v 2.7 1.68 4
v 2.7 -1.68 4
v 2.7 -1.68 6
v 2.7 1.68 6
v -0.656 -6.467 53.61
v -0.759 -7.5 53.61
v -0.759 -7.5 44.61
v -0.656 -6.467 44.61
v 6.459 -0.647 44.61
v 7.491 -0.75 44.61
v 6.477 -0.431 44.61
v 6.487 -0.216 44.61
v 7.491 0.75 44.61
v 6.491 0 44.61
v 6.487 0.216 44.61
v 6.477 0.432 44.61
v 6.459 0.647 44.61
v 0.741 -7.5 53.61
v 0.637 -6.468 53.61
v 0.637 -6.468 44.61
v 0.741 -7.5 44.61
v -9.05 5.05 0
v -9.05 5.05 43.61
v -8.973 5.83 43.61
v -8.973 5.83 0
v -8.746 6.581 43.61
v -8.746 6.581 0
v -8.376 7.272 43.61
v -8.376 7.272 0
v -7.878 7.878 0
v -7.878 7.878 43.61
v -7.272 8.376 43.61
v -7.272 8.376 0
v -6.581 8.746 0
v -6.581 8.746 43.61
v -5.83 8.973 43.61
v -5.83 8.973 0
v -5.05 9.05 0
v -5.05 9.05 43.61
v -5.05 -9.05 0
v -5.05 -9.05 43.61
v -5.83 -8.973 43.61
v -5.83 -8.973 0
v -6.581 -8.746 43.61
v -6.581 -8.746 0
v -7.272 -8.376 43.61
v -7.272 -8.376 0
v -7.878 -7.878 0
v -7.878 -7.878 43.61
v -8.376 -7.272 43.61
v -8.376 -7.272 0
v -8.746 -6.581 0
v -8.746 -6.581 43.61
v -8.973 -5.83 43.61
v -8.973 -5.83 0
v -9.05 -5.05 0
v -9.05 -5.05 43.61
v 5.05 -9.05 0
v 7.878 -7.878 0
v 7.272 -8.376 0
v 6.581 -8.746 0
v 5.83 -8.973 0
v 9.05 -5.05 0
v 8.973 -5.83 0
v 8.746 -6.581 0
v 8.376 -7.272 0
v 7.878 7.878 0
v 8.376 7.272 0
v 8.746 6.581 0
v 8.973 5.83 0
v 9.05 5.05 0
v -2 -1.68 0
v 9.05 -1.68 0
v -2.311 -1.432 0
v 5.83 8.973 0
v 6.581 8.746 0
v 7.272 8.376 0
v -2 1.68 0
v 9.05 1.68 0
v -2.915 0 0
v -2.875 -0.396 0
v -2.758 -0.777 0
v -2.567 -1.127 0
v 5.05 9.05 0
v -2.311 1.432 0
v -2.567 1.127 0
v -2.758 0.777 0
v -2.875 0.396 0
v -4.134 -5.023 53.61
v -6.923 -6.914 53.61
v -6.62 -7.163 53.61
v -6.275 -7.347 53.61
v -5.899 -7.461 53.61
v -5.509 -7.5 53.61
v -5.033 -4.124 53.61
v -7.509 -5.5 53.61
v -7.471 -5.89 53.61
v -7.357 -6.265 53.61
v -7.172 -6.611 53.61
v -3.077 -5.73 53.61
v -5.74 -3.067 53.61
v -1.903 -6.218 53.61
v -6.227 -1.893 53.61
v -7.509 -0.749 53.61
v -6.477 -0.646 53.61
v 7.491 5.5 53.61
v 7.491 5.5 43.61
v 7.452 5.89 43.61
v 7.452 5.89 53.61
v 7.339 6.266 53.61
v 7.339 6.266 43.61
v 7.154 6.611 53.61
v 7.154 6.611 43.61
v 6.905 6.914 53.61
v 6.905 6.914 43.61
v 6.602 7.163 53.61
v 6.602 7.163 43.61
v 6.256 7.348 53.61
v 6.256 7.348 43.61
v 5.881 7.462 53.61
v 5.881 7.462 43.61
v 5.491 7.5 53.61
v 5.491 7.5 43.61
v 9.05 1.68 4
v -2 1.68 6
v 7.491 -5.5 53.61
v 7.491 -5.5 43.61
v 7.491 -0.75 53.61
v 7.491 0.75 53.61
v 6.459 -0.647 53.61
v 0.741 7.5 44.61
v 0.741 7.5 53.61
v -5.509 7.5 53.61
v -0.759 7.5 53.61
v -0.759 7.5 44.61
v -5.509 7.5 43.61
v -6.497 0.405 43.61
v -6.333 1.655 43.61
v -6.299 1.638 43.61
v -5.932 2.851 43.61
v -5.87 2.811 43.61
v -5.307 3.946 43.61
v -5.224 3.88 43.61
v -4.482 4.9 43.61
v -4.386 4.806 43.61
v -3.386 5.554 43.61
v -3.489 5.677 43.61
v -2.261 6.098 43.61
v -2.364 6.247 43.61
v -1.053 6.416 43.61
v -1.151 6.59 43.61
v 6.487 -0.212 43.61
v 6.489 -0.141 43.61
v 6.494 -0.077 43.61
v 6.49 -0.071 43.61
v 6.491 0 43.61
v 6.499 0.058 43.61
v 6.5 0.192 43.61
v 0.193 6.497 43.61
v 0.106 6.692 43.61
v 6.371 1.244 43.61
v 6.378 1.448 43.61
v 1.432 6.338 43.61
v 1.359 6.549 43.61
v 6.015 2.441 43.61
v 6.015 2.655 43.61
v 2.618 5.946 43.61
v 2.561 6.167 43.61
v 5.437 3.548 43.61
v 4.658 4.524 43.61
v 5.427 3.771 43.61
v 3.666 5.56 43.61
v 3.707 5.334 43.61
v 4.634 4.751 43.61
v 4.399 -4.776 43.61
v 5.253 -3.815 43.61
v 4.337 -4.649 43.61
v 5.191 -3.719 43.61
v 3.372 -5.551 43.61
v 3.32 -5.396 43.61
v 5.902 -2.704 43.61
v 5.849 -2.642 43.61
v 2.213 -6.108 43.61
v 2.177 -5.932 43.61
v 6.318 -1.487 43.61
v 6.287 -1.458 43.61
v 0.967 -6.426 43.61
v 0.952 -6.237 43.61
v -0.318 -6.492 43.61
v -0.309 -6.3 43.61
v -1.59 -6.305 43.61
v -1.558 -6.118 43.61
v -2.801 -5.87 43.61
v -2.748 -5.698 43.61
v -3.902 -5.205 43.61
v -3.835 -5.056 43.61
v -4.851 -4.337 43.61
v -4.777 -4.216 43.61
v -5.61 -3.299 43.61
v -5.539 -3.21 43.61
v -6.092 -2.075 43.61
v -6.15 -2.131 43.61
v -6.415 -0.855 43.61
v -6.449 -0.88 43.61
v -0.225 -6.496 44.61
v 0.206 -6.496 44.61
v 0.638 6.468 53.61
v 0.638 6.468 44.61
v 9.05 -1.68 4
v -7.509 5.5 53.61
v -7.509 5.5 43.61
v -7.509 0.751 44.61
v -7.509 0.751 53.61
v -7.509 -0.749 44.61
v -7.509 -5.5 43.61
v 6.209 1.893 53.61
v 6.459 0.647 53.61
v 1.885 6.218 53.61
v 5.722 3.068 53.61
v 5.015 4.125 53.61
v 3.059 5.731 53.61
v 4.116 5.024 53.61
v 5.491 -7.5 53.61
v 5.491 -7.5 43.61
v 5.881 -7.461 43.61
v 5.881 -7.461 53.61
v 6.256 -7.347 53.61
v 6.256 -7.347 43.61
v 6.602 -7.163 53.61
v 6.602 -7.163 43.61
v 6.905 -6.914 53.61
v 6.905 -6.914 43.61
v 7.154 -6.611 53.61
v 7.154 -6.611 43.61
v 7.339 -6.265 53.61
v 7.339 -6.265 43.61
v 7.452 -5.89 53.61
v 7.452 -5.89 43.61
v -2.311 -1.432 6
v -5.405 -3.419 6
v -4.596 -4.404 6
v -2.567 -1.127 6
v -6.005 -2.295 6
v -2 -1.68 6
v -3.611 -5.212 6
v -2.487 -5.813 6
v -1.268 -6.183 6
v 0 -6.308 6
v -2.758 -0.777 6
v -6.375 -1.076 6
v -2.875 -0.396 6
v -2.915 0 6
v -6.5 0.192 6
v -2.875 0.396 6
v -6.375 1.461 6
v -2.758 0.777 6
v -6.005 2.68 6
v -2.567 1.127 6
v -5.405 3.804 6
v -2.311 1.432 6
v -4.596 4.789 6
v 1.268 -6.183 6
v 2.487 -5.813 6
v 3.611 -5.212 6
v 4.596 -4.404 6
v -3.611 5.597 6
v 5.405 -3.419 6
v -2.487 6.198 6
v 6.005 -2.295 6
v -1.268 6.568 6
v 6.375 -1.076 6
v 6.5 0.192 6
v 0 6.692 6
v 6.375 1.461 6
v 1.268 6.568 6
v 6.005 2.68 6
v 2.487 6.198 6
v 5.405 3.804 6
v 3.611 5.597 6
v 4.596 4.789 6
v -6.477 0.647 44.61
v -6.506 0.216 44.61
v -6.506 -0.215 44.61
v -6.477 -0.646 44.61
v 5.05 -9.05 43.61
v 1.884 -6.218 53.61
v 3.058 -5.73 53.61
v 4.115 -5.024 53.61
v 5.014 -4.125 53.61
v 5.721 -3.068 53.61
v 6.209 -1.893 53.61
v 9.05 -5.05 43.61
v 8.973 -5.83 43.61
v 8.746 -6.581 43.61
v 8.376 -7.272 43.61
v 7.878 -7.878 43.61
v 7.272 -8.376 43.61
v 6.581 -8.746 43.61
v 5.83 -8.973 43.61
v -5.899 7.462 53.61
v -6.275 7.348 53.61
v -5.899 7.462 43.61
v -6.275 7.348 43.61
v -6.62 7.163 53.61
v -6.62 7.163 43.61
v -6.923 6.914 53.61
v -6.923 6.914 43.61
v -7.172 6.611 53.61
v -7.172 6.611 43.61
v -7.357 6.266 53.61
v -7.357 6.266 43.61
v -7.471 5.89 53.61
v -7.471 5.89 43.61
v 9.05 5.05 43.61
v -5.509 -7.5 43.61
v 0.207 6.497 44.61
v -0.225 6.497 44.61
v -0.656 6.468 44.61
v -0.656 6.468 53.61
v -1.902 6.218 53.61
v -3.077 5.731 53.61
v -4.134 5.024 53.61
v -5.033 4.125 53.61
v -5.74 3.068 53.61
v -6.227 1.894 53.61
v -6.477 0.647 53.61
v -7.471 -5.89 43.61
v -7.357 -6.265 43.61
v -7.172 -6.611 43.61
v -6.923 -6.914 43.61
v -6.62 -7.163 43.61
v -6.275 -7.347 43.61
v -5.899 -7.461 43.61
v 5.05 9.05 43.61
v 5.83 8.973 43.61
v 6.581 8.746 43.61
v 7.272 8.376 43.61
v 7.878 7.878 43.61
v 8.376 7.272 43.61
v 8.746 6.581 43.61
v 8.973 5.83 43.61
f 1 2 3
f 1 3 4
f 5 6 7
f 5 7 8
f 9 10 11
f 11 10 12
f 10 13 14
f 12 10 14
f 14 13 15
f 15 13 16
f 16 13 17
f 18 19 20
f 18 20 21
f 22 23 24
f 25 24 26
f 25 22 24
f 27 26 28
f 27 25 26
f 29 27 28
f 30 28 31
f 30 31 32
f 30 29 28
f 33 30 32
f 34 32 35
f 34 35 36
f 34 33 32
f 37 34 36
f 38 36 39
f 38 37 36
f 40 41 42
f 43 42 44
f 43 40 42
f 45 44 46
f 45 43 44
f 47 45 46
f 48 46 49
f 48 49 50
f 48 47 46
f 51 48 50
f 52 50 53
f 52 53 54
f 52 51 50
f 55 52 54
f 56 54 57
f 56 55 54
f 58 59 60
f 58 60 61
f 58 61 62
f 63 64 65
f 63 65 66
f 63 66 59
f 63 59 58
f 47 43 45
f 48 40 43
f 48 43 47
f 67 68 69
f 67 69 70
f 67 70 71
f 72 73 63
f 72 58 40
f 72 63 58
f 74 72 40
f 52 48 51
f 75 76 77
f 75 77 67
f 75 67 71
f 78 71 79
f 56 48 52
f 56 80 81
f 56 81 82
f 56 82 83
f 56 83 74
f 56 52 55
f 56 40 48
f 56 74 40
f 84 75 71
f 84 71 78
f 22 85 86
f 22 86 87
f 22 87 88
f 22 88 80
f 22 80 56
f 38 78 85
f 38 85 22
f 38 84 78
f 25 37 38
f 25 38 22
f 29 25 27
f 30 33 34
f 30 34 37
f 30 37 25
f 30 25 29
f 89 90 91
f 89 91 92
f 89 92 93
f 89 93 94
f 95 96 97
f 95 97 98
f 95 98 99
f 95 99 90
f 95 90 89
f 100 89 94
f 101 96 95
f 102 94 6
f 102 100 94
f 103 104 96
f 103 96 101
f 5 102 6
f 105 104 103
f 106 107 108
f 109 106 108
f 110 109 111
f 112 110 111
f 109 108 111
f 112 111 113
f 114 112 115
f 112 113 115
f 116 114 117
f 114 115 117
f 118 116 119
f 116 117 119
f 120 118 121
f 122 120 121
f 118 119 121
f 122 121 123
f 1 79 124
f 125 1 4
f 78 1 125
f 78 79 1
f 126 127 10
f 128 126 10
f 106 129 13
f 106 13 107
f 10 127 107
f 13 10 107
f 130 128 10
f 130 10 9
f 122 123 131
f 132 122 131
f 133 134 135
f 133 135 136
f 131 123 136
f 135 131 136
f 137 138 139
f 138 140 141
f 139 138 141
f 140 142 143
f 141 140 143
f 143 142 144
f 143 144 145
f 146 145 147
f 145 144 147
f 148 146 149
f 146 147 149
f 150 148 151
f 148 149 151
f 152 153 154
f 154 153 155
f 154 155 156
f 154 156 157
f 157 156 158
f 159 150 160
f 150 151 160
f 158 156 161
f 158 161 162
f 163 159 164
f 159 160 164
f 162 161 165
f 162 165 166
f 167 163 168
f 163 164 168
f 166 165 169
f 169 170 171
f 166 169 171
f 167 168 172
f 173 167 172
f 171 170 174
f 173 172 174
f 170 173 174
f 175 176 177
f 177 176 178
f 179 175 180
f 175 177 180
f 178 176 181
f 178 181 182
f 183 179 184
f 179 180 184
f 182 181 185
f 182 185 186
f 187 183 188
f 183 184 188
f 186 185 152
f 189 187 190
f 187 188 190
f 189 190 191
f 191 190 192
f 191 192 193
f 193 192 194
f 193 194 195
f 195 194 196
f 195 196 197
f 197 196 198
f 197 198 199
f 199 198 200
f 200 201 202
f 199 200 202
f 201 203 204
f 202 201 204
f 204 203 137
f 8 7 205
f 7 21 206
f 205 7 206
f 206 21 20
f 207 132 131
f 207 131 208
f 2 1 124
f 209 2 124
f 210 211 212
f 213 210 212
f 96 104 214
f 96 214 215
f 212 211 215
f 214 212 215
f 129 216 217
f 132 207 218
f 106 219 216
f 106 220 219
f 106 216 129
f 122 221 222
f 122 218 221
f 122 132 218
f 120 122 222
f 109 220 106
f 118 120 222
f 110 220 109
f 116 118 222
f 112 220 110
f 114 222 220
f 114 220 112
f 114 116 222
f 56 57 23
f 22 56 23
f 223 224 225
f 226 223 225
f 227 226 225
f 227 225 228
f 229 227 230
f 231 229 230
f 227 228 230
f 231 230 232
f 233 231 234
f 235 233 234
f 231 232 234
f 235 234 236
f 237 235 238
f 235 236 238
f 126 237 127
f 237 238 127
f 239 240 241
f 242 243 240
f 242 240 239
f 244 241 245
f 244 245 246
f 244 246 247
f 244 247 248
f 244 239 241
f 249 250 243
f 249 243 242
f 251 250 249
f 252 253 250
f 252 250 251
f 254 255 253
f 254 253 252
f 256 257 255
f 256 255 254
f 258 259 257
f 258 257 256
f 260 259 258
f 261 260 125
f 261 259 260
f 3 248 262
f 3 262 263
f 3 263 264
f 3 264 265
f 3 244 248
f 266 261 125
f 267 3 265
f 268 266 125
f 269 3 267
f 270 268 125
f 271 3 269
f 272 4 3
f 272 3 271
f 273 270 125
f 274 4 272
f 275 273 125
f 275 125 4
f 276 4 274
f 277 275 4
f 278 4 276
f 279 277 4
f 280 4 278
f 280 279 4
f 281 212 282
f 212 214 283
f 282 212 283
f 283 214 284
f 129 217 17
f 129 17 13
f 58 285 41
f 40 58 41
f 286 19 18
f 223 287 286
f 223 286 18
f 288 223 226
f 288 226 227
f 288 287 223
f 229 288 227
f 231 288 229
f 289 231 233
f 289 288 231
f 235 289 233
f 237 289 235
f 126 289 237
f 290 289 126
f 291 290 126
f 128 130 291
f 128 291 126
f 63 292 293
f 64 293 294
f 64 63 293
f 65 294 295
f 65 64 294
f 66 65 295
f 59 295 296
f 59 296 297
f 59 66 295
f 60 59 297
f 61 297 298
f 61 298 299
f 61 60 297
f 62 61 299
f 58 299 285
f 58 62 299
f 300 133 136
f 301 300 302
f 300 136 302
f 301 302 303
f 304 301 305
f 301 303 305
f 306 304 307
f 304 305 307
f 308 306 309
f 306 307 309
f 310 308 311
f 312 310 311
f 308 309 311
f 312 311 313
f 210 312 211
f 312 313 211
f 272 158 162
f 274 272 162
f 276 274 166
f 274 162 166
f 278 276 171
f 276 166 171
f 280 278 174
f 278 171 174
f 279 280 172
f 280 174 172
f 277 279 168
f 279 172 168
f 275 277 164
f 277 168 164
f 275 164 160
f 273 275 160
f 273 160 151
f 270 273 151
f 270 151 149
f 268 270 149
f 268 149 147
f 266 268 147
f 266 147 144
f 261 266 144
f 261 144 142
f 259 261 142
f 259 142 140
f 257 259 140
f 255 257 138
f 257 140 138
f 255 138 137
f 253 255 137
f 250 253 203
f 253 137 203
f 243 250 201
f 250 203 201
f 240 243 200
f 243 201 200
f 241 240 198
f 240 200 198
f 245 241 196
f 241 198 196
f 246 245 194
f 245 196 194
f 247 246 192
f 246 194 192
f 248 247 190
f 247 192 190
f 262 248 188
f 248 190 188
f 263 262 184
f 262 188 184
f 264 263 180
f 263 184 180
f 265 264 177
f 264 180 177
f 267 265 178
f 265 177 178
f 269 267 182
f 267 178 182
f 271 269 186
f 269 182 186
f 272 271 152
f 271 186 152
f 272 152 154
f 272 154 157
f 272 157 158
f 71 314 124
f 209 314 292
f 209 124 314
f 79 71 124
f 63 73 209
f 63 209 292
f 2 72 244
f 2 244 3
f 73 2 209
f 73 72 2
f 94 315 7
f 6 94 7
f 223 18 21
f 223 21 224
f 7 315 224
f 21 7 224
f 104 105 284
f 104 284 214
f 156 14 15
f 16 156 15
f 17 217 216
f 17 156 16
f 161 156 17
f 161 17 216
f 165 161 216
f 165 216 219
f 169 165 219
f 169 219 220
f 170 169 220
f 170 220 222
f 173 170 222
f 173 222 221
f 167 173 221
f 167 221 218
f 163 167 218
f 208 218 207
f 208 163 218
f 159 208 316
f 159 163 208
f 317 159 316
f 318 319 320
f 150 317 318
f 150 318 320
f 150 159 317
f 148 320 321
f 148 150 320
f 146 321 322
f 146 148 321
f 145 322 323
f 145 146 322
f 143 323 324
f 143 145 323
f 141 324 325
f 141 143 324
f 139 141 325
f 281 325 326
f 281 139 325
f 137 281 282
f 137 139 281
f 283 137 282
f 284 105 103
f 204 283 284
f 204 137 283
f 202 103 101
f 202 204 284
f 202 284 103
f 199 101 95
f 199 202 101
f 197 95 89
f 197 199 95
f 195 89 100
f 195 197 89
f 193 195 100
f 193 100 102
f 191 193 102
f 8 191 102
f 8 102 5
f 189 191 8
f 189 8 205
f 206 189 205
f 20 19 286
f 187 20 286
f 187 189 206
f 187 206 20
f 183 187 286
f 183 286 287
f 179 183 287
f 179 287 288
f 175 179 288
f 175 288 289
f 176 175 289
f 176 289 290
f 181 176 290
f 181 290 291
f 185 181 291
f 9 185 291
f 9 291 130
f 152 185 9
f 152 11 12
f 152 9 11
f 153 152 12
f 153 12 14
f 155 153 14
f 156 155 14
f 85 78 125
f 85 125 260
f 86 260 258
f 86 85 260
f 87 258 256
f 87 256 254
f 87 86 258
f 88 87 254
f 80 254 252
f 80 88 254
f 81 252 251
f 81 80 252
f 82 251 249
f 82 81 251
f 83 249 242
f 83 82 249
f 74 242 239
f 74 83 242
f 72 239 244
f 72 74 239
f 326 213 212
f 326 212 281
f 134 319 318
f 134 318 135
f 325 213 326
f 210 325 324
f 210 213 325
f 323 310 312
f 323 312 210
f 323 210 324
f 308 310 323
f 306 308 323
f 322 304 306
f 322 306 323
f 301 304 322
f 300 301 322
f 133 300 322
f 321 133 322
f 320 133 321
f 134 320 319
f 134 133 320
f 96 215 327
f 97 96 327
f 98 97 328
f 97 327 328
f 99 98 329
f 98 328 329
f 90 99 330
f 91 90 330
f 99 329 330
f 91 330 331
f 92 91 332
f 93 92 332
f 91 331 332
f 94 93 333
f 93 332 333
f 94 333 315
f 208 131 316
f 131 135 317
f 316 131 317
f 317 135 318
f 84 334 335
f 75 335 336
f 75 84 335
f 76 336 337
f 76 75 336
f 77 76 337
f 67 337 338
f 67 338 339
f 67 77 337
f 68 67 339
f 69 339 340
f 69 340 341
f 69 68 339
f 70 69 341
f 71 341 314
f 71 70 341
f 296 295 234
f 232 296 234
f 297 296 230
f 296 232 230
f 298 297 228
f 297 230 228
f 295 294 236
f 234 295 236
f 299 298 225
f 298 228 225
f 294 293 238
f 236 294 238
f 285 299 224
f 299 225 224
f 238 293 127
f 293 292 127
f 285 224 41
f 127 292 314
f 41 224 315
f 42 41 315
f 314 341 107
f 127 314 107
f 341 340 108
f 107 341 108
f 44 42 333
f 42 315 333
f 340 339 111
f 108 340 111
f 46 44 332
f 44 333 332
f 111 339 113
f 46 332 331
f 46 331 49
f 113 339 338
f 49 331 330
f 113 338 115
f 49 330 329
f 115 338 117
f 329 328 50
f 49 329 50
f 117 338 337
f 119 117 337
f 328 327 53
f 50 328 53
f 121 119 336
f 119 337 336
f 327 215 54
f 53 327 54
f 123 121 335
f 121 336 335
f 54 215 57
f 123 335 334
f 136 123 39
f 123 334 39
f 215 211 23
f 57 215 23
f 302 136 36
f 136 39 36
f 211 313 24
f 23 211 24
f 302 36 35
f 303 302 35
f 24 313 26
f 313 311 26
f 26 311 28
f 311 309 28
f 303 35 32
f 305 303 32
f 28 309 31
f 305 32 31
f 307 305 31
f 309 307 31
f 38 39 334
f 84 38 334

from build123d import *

# Parameters (mm, degrees)
BOSS_EXTRUDE1_DEPTH = 43.61
SKETCH3_R           = 6.5
BOSS_EXTRUDE2_DEPTH = 10
CUT_EXTRUDE3_DEPTH  = 4
CUT_EXTRUDE6_DEPTH  = 2
CUT_EXTRUDE7_DEPTH  = 9
CIRPATTERN1_COUNT   = 4
SKETCH12_R          = 6.5
CUT_EXTRUDE8_DEPTH  = 37.61


with BuildPart() as part:
    # Sketch1 → Boss-Extrude1 (new body)
    with BuildSketch(Plane.XY):
        with BuildLine():
            Line((-5.05, 9.05), (5.05, 9.05))
            ThreePointArc((5.05, 9.05), (7.878427125, 7.878427125), (9.05, 5.05))
            Line((9.05, 5.05), (9.05, -5.05))
            ThreePointArc((9.05, -5.05), (7.878427125, -7.878427125), (5.05, -9.05))
            Line((5.05, -9.05), (-5.05, -9.05))
            ThreePointArc((-5.05, -9.05), (-7.878427125, -7.878427125), (-9.05, -5.05))
            Line((-9.05, -5.05), (-9.05, 5.05))
            ThreePointArc((-9.05, 5.05), (-7.878427125, 7.878427125), (-5.05, 9.05))
        make_face()
    extrude(amount=BOSS_EXTRUDE1_DEPTH)

    # Sketch3 → Boss-Extrude2 (add)
    with BuildSketch(Plane.XY.offset(43.61)):
        with BuildLine():
            Line((-5.509134554, -7.499739888), (5.490865446, -7.499739888))
            ThreePointArc((5.490865446, -7.499739888), (6.905079008, -6.91395345), (7.490865446, -5.499739888))
            Line((7.490865446, -5.499739888), (7.490865446, 5.500260112))
            ThreePointArc((7.490865446, 5.500260112), (6.905079008, 6.914473675), (5.490865446, 7.500260112))
            Line((5.490865446, 7.500260112), (-5.509134554, 7.500260112))
            ThreePointArc((-5.509134554, 7.500260112), (-6.923348116, 6.914473675), (-7.509134554, 5.500260112))
            Line((-7.509134554, 5.500260112), (-7.509134554, -5.499739888))
            ThreePointArc((-7.509134554, -5.499739888), (-6.923348116, -6.91395345), (-5.509134554, -7.499739888))
        make_face()
        with Locations((-0.009134554, 0.000260112)):
            Circle(SKETCH3_R, mode=Mode.SUBTRACT)
    extrude(amount=BOSS_EXTRUDE2_DEPTH)

    # Sketch6 → Cut-Extrude3 (cut)
    with BuildSketch(Plane.XY):
        with BuildLine():
            Line((-2, -1.68), (2, -1.68))
            Line((2, -1.68), (9.05, -1.68))
            Line((9.05, -1.68), (9.05, 1.68))
            Line((9.05, 1.68), (2, 1.68))
            Line((2, 1.68), (-2, 1.68))
            ThreePointArc((-2, 1.68), (-2.914827203, 0), (-2, -1.68))
        make_face()
    extrude(amount=CUT_EXTRUDE3_DEPTH, mode=Mode.SUBTRACT)

    # Sketch10 → Cut-Extrude6 (cut)
    with BuildSketch(Plane(origin=(0, 0, 4), x_dir=(-1, 0, 0), z_dir=(0, 0, -1))):
        with BuildLine():
            Line((-2.7, 1.68), (2, 1.68))
            ThreePointArc((2, 1.68), (2.914827203, 0), (2, -1.68))
            Line((2, -1.68), (-2.7, -1.68))
            Line((-2.7, -1.68), (-2.7, 1.68))
        make_face()
    extrude(amount=-CUT_EXTRUDE6_DEPTH, mode=Mode.SUBTRACT)

    # Sketch11 → Cut-Extrude7 (cut)
    with BuildSketch(Plane.XY.offset(53.61)):
        Polygon((0, 0), (7.490865446, 0.75), (7.490865446, -0.75), align=None)
    cut_extrude7 = extrude(amount=-CUT_EXTRUDE7_DEPTH, mode=Mode.SUBTRACT)

    # CirPattern1: Cut-Extrude7 ×4 about axis
    cirpattern1_axis = Axis((-0.009134554, 0.000260112, 0), (0, 0, 1))
    for i in range(1, CIRPATTERN1_COUNT):
        add(cut_extrude7.rotate(cirpattern1_axis, i * 360 / CIRPATTERN1_COUNT), mode=Mode.SUBTRACT)

    # Sketch12 → Cut-Extrude8 (cut)
    with BuildSketch(Plane.XY.offset(43.61)):
        with Locations((0, 0.192488852)):
            Circle(SKETCH12_R)
    extrude(amount=-CUT_EXTRUDE8_DEPTH, mode=Mode.SUBTRACT)


solid = part.part
